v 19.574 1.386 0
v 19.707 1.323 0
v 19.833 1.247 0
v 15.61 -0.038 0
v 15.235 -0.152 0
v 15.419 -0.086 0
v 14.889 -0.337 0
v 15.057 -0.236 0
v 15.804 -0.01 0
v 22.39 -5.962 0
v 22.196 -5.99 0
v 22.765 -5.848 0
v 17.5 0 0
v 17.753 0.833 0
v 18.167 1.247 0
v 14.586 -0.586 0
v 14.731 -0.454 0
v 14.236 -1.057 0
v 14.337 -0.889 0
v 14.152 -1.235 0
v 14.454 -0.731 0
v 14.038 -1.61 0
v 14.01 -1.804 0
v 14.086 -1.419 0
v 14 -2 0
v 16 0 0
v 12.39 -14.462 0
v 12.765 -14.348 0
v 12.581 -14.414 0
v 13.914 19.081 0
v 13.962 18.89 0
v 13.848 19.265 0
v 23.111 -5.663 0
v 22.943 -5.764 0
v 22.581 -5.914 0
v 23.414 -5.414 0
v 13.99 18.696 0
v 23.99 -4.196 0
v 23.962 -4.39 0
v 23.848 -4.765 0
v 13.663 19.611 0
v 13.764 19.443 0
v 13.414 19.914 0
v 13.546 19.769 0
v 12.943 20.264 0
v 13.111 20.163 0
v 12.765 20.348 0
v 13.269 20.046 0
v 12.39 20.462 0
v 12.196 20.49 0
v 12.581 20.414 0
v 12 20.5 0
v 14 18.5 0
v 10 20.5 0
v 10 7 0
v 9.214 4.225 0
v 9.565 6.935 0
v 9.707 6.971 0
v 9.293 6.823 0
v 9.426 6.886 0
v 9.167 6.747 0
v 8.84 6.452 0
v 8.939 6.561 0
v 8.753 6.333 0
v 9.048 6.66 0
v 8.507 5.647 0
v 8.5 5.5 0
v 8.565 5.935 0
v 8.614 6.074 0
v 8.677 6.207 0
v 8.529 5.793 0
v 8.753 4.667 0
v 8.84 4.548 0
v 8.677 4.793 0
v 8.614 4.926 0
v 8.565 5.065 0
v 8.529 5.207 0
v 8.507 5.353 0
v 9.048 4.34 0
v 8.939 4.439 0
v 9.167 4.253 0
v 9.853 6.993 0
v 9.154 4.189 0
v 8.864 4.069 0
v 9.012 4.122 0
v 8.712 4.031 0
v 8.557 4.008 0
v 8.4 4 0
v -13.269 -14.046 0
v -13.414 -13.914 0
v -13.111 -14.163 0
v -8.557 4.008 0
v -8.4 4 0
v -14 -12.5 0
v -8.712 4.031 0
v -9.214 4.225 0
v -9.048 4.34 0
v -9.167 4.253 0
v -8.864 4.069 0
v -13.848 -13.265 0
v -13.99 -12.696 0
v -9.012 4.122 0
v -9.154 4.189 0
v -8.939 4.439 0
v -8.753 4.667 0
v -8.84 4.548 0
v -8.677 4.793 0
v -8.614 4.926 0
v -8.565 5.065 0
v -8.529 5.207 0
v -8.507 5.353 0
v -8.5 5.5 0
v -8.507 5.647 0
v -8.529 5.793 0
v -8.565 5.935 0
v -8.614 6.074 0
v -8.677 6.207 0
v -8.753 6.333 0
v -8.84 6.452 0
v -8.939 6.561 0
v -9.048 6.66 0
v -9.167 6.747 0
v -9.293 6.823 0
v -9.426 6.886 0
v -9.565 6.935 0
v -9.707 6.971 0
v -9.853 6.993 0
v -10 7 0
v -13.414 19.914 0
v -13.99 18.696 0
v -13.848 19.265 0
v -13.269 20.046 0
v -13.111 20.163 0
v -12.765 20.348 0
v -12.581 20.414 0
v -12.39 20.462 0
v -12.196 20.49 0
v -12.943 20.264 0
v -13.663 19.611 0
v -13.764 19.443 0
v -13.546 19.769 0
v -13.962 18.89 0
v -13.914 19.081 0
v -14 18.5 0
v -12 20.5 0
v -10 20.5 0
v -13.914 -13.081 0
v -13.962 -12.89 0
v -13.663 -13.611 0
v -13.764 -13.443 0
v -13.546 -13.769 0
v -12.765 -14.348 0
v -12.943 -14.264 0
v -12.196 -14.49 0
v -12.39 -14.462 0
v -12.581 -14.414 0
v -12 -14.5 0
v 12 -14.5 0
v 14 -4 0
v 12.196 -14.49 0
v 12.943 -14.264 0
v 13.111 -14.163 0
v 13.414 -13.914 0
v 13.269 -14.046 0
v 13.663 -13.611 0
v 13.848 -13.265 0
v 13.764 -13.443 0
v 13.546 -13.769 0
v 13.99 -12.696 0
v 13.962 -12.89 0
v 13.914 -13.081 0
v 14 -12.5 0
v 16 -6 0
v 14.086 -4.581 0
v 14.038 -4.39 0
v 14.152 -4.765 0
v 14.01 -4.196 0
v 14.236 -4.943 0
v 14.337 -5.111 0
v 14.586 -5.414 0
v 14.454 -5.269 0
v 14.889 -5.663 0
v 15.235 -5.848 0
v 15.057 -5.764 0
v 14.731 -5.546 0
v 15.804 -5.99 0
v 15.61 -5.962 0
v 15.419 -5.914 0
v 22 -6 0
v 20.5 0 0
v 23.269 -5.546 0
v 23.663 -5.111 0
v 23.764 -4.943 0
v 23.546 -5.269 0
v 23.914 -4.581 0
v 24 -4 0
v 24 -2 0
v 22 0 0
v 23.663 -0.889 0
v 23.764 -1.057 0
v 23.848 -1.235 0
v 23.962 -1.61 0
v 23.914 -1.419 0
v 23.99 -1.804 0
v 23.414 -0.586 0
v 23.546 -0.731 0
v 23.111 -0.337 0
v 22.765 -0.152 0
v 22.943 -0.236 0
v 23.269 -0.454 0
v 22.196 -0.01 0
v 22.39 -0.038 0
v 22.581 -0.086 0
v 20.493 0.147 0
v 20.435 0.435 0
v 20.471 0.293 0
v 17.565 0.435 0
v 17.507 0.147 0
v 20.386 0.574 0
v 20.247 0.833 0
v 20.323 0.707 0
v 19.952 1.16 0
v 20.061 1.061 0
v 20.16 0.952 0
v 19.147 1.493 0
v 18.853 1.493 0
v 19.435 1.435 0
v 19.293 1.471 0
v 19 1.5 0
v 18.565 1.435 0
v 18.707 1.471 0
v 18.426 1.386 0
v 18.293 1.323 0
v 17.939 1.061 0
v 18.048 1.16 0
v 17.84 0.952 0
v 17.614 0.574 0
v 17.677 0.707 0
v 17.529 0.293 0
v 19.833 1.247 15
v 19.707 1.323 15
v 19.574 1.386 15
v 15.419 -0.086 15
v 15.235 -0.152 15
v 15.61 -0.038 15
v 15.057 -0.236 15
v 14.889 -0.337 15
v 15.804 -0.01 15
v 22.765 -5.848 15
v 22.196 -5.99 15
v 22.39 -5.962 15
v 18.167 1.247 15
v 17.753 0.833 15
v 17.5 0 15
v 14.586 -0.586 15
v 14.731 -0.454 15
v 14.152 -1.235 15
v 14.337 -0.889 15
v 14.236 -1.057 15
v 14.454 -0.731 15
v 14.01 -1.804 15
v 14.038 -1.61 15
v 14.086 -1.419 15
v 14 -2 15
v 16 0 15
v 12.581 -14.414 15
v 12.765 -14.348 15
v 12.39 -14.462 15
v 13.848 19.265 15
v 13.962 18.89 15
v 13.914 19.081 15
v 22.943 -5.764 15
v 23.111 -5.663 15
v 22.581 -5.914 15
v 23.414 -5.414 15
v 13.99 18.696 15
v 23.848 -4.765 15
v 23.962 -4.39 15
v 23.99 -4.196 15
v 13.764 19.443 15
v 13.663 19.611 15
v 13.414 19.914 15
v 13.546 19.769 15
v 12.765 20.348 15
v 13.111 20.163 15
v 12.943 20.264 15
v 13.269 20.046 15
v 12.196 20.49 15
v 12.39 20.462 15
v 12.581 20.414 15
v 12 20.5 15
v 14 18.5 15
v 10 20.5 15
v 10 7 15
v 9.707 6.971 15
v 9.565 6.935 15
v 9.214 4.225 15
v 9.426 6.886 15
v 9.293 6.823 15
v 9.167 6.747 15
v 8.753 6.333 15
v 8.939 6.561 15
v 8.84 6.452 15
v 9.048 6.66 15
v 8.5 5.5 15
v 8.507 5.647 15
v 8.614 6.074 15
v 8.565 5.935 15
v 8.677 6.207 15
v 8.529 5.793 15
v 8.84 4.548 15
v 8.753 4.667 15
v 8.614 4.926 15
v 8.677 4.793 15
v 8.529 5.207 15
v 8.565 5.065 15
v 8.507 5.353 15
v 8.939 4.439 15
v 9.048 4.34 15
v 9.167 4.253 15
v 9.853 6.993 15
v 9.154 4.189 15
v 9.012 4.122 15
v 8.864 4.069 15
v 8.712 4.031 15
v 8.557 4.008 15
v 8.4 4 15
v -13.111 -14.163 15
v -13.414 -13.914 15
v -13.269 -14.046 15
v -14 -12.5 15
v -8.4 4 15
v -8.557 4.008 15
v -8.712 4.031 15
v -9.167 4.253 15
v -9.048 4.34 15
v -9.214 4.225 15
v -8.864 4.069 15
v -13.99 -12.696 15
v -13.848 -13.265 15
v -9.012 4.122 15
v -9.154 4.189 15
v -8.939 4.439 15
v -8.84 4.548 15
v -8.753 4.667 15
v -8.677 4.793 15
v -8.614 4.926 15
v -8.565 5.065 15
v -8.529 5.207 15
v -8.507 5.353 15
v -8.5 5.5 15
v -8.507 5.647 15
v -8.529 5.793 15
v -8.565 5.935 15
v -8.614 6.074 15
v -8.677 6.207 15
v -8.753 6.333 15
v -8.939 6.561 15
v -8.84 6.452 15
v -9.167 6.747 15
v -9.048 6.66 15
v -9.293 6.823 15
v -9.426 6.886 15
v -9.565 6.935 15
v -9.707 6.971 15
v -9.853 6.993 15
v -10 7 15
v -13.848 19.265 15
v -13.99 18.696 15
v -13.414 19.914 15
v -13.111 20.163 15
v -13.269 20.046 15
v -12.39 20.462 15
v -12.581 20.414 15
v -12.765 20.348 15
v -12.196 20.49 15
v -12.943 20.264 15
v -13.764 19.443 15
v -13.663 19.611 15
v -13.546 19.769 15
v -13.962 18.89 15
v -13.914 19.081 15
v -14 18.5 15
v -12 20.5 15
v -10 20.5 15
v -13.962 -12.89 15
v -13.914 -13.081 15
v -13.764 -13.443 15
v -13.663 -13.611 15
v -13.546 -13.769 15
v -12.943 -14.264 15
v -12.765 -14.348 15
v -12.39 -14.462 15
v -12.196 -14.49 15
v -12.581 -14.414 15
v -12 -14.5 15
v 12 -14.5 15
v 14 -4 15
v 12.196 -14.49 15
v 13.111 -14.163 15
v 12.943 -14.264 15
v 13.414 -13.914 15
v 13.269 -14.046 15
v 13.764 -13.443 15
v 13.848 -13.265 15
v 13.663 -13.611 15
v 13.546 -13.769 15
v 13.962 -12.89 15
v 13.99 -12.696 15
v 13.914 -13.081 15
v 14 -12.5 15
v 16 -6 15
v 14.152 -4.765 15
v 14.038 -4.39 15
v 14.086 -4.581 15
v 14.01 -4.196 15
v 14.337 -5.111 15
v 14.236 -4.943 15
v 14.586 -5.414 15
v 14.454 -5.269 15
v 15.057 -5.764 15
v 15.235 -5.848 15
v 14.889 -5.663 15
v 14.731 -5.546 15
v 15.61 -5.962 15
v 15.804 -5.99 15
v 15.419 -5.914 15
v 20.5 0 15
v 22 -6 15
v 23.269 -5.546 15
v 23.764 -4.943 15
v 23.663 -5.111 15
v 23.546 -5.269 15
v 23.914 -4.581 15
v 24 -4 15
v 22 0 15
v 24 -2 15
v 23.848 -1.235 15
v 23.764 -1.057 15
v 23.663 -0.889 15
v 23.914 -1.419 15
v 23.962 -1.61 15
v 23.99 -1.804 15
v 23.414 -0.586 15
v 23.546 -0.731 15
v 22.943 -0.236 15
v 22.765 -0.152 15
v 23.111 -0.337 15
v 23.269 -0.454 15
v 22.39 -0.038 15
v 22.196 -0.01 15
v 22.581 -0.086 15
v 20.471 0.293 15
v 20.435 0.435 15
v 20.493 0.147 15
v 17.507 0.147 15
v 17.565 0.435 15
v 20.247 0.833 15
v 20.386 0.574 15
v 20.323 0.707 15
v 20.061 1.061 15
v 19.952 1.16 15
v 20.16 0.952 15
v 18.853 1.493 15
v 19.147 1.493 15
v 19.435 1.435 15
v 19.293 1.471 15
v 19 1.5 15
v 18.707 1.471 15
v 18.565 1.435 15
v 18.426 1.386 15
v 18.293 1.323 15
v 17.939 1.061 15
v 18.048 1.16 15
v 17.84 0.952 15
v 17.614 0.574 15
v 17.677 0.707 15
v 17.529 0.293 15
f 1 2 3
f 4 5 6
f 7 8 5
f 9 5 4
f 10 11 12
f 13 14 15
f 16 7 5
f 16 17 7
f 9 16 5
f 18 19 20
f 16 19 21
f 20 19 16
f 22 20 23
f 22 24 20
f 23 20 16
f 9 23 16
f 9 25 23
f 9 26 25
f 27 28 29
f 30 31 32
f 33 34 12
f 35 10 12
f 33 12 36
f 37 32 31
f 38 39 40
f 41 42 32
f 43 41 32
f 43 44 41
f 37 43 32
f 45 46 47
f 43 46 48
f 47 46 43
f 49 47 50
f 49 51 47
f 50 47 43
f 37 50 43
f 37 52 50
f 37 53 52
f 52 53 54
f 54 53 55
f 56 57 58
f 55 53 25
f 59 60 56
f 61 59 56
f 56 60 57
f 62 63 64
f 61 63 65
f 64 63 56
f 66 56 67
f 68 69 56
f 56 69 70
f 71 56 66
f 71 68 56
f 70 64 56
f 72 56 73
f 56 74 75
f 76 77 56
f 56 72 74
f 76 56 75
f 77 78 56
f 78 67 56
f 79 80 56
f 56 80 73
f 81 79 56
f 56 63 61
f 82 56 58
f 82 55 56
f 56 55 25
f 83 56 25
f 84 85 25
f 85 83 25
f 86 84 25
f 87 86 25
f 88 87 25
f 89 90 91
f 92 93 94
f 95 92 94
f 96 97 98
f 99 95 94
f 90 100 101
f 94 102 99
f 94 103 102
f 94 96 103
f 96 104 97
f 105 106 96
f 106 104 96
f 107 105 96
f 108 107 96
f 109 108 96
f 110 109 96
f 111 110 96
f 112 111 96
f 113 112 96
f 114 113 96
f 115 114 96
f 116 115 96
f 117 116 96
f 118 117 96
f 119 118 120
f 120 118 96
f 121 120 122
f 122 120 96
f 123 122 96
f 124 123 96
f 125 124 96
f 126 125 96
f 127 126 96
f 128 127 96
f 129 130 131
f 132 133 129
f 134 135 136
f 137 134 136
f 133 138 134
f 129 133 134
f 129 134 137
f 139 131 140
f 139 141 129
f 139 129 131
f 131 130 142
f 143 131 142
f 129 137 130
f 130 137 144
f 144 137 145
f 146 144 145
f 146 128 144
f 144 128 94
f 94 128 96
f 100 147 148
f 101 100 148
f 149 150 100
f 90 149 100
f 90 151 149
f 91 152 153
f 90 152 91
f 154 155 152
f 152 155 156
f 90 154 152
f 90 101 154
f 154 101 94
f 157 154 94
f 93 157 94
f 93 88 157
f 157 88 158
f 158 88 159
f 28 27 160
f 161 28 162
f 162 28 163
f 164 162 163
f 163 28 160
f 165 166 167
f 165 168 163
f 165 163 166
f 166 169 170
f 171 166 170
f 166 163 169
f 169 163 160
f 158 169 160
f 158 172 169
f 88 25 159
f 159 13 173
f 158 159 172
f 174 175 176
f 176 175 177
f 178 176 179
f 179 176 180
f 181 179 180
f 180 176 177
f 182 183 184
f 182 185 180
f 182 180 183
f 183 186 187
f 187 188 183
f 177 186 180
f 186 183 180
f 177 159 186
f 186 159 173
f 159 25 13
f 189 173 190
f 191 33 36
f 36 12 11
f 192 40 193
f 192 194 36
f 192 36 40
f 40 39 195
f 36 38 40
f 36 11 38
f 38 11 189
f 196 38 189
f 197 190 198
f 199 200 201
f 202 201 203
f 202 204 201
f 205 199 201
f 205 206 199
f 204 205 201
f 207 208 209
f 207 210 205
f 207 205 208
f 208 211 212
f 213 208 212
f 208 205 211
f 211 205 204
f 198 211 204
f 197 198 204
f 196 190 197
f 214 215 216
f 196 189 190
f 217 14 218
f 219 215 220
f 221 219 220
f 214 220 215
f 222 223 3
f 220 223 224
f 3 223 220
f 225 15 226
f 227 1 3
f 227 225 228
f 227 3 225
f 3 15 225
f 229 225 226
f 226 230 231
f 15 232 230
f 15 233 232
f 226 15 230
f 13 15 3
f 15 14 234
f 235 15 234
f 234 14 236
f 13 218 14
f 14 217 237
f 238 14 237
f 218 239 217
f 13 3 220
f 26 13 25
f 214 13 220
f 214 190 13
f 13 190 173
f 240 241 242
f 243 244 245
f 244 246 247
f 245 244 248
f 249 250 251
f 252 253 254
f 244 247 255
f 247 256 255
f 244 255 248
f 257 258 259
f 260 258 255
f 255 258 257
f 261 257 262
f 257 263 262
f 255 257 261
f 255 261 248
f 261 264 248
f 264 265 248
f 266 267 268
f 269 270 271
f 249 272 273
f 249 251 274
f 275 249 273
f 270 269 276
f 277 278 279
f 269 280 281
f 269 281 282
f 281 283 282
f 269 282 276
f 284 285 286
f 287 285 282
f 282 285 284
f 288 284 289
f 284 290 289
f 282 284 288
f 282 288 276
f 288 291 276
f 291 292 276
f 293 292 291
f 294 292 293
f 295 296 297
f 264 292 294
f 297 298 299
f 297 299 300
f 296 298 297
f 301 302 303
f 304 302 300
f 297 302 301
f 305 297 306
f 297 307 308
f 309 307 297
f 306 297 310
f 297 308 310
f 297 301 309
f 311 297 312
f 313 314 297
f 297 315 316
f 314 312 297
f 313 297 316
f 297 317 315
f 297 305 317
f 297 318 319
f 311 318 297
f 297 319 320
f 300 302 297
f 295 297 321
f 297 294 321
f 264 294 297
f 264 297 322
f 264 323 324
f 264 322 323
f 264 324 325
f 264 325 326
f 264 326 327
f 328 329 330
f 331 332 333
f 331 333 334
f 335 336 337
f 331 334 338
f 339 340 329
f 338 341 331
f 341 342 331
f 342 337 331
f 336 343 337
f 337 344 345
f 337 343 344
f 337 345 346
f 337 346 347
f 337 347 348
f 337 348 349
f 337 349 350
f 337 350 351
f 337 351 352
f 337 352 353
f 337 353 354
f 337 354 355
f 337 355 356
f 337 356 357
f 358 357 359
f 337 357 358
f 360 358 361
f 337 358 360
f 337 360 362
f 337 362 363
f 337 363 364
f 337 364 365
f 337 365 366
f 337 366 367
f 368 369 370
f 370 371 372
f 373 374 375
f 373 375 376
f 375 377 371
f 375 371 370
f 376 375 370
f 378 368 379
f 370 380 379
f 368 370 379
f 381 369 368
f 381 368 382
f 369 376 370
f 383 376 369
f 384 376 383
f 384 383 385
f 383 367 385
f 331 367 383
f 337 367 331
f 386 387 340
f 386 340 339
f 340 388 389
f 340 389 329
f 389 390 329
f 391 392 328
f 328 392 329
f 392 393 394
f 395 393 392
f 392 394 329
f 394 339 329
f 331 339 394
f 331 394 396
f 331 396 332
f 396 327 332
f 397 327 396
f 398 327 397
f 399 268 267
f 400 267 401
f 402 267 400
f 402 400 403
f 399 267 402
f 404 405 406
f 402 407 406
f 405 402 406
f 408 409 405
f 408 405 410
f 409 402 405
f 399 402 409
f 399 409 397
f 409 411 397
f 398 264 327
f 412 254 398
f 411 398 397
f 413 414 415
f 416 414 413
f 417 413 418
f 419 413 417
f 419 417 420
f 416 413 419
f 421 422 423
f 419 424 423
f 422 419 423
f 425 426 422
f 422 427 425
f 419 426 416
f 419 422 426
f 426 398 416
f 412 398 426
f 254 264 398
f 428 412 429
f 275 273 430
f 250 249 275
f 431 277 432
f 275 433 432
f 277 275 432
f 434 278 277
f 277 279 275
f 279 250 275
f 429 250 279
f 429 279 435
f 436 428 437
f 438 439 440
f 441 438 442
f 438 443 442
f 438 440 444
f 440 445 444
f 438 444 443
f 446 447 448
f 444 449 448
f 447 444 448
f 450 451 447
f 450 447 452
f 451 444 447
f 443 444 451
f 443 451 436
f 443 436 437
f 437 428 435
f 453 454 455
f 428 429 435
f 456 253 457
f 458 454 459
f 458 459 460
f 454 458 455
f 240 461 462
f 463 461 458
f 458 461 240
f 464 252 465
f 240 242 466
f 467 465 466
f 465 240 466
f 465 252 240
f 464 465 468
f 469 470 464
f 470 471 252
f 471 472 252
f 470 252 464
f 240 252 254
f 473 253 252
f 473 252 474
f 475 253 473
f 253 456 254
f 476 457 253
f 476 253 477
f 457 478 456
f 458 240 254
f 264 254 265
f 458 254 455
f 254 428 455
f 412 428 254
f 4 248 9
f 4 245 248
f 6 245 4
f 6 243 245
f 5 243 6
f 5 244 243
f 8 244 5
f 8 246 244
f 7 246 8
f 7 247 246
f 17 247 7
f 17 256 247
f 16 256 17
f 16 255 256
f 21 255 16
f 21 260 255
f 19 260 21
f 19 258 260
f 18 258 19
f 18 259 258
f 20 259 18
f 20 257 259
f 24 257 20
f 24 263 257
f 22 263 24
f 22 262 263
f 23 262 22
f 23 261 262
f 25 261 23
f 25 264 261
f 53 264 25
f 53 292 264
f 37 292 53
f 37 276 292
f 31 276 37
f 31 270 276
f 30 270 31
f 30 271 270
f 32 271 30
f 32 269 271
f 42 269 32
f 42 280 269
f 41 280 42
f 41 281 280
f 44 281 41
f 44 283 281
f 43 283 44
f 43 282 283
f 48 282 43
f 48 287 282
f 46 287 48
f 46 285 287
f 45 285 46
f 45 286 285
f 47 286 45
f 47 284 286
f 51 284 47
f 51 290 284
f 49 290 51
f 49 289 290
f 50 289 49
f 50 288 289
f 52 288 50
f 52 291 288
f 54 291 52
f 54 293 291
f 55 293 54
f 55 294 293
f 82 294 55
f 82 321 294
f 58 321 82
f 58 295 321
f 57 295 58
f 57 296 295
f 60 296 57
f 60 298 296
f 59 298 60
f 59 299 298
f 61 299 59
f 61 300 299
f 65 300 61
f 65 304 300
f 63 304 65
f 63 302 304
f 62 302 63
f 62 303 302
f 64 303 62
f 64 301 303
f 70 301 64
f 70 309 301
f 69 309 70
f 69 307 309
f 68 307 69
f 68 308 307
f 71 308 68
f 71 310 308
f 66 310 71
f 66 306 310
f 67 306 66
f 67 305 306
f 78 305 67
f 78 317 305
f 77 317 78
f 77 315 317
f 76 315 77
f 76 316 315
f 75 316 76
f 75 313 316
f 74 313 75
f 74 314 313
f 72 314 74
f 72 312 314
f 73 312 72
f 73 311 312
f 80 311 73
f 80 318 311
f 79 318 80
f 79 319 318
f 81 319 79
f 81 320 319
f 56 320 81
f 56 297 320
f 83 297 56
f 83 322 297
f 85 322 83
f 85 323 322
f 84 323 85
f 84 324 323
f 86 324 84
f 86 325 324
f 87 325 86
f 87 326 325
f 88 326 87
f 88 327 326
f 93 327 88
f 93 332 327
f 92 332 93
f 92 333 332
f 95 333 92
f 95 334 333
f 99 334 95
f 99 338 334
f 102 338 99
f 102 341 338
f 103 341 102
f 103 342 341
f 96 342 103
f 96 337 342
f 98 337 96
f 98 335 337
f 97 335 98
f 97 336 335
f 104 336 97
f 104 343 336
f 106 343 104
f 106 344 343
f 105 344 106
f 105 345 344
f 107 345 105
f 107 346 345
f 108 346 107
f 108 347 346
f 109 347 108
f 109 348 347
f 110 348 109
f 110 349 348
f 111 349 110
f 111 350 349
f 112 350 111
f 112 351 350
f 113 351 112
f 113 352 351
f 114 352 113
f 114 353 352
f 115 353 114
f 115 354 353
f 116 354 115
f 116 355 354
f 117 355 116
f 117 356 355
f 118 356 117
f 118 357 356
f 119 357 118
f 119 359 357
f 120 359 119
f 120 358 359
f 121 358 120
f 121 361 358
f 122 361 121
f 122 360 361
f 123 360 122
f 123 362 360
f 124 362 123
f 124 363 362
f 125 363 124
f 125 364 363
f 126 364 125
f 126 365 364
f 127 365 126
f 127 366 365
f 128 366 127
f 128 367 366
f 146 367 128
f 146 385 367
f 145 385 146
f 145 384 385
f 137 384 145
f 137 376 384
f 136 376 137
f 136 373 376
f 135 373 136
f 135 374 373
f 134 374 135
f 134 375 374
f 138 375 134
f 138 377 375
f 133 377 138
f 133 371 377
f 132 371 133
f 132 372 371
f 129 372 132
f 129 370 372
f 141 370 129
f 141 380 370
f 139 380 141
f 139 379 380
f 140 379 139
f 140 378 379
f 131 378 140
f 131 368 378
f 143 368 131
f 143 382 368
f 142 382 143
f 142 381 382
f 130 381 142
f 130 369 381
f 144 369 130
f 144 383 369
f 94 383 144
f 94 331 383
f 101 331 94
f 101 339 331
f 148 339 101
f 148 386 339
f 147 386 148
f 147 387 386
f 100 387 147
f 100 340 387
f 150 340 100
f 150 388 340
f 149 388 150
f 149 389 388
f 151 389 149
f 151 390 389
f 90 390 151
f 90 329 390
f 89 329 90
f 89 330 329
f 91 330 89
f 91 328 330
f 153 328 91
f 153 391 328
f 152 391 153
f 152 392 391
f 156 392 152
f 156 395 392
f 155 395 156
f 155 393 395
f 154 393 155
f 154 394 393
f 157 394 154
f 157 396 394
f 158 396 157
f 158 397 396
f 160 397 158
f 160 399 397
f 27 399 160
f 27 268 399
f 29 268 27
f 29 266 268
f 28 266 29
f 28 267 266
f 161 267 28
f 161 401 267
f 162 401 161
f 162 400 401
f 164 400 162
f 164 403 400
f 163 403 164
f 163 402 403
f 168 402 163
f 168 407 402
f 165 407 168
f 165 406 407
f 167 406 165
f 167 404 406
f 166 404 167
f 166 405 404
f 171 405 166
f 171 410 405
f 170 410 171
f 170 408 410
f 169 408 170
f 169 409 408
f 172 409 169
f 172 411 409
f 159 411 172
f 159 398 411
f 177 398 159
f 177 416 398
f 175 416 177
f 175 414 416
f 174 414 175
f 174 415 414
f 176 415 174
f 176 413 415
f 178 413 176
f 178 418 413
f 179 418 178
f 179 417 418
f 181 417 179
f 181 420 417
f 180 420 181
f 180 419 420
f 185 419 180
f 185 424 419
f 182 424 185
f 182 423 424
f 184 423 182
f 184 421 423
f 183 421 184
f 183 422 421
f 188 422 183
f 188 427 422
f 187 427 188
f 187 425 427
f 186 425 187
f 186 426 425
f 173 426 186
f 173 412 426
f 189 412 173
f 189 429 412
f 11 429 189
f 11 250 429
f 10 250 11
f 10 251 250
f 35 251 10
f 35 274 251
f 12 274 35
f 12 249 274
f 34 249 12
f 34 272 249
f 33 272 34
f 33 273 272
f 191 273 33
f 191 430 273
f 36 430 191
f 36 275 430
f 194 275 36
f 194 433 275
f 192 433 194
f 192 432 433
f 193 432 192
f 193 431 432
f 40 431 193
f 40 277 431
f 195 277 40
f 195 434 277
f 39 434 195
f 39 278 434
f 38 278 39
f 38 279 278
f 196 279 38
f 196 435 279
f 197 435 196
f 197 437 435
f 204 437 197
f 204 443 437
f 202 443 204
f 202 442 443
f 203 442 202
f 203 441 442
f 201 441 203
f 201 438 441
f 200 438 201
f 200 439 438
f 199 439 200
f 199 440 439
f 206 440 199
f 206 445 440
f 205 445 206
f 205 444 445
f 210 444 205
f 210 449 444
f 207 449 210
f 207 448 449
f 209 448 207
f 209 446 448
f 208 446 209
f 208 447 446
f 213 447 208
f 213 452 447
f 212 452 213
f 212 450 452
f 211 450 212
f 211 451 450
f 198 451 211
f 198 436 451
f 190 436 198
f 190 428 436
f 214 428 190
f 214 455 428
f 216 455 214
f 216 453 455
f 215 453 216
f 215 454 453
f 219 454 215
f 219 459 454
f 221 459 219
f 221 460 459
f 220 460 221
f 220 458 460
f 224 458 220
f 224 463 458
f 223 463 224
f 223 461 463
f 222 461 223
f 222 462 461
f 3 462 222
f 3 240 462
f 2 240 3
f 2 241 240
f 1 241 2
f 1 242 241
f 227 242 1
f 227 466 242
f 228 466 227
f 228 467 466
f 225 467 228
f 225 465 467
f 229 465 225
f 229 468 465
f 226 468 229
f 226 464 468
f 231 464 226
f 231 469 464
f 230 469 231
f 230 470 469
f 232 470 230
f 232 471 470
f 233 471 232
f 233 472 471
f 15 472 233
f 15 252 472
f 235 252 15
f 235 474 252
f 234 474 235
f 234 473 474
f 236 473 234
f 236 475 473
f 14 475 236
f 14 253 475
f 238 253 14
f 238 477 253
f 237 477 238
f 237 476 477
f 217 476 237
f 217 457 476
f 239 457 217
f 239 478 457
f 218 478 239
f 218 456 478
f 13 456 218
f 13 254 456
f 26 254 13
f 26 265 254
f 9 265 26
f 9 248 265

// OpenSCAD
//////////////////////////////////////////////////////
// Parametrische U-klem met zij-grip
//////////////////////////////////////////////////////

// Algemene resolutie
$fn = 64;

// Hoofdparameters
thickness   = 4;    // Dikte materiaal
inner_width = 20;   // Binnenbreedte tussen poten (X-richting)
inner_height= 25;   // Binnenhoogte U (Y-richting)
depth       = 15;   // Lengte in Z-richting (extrusie)

round_r     = 2;    // Algemene afrondingsradius randen
bulge_r     = 1.5;  // Bolling (binnenkant & grip)

grip_len    = 10;   // Lengte grip die uitsteekt (X-richting)
grip_height = 6;    // Dikte/hoogte grip (Y-richting)

// Afgeleide maten
outer_width  = inner_width  + 2*thickness;
outer_height = inner_height + thickness;     // bovenzijde is dikte
total_height = outer_height + grip_height;   // incl. grip naar beneden

//////////////////////////////////////////////////////
// Hulpmodule: afgeronde rechthoek (2D)
//////////////////////////////////////////////////////
module rounded_rect(w, h, r) {
    r2 = min(r, min(w, h)/2);
    minkowski() {
        square([w - 2*r2, h - 2*r2], center = true);
        circle(r = r2);
    }
}

//////////////////////////////////////////////////////
// Hulpmodule: kleine bolling (2D) aan rand
//////////////////////////////////////////////////////
module bulge(r) {
    circle(r = r);
}

//////////////////////////////////////////////////////
// 2D-profiel van de U + grip
//////////////////////////////////////////////////////
module clamp_profile_2d() {
    difference() {
        union() {
            // Buitencontour U (rechthoek met afgeronde hoeken)
            translate([0, (grip_height)/2])
                rounded_rect(outer_width, total_height, round_r);

            // Grip die alleen aan één zijde uitsteekt (bijv. rechts)
            translate([ (outer_width/2) + grip_len/2, -grip_height/2 ])
                rounded_rect(grip_len, grip_height, round_r);
        }

        // Binnenruimte U uitsnijden
        translate([0, (thickness + inner_height/2)])
            rounded_rect(inner_width, inner_height, round_r * 0.8);
    }

    // Bollingen aan binnenzijde poten (onder)
    // Links en rechts onderin de binnenkant
    translate([inner_width/2, thickness + bulge_r])
        bulge(bulge_r);
    translate([-inner_width/2, thickness + bulge_r])
        bulge(bulge_r);

    // Bolling op de grip (bovenop grip)
    translate([ (outer_width/2) + grip_len/2, 0 ])
        bulge(bulge_r);
}

//////////////////////////////////////////////////////
// 3D model: profiel extruderen
//////////////////////////////////////////////////////
module u_clamp() {
    linear_extrude(height = depth)
        clamp_profile_2d();
}

//////////////////////////////////////////////////////
// Aanroep
//////////////////////////////////////////////////////
u_clamp();
